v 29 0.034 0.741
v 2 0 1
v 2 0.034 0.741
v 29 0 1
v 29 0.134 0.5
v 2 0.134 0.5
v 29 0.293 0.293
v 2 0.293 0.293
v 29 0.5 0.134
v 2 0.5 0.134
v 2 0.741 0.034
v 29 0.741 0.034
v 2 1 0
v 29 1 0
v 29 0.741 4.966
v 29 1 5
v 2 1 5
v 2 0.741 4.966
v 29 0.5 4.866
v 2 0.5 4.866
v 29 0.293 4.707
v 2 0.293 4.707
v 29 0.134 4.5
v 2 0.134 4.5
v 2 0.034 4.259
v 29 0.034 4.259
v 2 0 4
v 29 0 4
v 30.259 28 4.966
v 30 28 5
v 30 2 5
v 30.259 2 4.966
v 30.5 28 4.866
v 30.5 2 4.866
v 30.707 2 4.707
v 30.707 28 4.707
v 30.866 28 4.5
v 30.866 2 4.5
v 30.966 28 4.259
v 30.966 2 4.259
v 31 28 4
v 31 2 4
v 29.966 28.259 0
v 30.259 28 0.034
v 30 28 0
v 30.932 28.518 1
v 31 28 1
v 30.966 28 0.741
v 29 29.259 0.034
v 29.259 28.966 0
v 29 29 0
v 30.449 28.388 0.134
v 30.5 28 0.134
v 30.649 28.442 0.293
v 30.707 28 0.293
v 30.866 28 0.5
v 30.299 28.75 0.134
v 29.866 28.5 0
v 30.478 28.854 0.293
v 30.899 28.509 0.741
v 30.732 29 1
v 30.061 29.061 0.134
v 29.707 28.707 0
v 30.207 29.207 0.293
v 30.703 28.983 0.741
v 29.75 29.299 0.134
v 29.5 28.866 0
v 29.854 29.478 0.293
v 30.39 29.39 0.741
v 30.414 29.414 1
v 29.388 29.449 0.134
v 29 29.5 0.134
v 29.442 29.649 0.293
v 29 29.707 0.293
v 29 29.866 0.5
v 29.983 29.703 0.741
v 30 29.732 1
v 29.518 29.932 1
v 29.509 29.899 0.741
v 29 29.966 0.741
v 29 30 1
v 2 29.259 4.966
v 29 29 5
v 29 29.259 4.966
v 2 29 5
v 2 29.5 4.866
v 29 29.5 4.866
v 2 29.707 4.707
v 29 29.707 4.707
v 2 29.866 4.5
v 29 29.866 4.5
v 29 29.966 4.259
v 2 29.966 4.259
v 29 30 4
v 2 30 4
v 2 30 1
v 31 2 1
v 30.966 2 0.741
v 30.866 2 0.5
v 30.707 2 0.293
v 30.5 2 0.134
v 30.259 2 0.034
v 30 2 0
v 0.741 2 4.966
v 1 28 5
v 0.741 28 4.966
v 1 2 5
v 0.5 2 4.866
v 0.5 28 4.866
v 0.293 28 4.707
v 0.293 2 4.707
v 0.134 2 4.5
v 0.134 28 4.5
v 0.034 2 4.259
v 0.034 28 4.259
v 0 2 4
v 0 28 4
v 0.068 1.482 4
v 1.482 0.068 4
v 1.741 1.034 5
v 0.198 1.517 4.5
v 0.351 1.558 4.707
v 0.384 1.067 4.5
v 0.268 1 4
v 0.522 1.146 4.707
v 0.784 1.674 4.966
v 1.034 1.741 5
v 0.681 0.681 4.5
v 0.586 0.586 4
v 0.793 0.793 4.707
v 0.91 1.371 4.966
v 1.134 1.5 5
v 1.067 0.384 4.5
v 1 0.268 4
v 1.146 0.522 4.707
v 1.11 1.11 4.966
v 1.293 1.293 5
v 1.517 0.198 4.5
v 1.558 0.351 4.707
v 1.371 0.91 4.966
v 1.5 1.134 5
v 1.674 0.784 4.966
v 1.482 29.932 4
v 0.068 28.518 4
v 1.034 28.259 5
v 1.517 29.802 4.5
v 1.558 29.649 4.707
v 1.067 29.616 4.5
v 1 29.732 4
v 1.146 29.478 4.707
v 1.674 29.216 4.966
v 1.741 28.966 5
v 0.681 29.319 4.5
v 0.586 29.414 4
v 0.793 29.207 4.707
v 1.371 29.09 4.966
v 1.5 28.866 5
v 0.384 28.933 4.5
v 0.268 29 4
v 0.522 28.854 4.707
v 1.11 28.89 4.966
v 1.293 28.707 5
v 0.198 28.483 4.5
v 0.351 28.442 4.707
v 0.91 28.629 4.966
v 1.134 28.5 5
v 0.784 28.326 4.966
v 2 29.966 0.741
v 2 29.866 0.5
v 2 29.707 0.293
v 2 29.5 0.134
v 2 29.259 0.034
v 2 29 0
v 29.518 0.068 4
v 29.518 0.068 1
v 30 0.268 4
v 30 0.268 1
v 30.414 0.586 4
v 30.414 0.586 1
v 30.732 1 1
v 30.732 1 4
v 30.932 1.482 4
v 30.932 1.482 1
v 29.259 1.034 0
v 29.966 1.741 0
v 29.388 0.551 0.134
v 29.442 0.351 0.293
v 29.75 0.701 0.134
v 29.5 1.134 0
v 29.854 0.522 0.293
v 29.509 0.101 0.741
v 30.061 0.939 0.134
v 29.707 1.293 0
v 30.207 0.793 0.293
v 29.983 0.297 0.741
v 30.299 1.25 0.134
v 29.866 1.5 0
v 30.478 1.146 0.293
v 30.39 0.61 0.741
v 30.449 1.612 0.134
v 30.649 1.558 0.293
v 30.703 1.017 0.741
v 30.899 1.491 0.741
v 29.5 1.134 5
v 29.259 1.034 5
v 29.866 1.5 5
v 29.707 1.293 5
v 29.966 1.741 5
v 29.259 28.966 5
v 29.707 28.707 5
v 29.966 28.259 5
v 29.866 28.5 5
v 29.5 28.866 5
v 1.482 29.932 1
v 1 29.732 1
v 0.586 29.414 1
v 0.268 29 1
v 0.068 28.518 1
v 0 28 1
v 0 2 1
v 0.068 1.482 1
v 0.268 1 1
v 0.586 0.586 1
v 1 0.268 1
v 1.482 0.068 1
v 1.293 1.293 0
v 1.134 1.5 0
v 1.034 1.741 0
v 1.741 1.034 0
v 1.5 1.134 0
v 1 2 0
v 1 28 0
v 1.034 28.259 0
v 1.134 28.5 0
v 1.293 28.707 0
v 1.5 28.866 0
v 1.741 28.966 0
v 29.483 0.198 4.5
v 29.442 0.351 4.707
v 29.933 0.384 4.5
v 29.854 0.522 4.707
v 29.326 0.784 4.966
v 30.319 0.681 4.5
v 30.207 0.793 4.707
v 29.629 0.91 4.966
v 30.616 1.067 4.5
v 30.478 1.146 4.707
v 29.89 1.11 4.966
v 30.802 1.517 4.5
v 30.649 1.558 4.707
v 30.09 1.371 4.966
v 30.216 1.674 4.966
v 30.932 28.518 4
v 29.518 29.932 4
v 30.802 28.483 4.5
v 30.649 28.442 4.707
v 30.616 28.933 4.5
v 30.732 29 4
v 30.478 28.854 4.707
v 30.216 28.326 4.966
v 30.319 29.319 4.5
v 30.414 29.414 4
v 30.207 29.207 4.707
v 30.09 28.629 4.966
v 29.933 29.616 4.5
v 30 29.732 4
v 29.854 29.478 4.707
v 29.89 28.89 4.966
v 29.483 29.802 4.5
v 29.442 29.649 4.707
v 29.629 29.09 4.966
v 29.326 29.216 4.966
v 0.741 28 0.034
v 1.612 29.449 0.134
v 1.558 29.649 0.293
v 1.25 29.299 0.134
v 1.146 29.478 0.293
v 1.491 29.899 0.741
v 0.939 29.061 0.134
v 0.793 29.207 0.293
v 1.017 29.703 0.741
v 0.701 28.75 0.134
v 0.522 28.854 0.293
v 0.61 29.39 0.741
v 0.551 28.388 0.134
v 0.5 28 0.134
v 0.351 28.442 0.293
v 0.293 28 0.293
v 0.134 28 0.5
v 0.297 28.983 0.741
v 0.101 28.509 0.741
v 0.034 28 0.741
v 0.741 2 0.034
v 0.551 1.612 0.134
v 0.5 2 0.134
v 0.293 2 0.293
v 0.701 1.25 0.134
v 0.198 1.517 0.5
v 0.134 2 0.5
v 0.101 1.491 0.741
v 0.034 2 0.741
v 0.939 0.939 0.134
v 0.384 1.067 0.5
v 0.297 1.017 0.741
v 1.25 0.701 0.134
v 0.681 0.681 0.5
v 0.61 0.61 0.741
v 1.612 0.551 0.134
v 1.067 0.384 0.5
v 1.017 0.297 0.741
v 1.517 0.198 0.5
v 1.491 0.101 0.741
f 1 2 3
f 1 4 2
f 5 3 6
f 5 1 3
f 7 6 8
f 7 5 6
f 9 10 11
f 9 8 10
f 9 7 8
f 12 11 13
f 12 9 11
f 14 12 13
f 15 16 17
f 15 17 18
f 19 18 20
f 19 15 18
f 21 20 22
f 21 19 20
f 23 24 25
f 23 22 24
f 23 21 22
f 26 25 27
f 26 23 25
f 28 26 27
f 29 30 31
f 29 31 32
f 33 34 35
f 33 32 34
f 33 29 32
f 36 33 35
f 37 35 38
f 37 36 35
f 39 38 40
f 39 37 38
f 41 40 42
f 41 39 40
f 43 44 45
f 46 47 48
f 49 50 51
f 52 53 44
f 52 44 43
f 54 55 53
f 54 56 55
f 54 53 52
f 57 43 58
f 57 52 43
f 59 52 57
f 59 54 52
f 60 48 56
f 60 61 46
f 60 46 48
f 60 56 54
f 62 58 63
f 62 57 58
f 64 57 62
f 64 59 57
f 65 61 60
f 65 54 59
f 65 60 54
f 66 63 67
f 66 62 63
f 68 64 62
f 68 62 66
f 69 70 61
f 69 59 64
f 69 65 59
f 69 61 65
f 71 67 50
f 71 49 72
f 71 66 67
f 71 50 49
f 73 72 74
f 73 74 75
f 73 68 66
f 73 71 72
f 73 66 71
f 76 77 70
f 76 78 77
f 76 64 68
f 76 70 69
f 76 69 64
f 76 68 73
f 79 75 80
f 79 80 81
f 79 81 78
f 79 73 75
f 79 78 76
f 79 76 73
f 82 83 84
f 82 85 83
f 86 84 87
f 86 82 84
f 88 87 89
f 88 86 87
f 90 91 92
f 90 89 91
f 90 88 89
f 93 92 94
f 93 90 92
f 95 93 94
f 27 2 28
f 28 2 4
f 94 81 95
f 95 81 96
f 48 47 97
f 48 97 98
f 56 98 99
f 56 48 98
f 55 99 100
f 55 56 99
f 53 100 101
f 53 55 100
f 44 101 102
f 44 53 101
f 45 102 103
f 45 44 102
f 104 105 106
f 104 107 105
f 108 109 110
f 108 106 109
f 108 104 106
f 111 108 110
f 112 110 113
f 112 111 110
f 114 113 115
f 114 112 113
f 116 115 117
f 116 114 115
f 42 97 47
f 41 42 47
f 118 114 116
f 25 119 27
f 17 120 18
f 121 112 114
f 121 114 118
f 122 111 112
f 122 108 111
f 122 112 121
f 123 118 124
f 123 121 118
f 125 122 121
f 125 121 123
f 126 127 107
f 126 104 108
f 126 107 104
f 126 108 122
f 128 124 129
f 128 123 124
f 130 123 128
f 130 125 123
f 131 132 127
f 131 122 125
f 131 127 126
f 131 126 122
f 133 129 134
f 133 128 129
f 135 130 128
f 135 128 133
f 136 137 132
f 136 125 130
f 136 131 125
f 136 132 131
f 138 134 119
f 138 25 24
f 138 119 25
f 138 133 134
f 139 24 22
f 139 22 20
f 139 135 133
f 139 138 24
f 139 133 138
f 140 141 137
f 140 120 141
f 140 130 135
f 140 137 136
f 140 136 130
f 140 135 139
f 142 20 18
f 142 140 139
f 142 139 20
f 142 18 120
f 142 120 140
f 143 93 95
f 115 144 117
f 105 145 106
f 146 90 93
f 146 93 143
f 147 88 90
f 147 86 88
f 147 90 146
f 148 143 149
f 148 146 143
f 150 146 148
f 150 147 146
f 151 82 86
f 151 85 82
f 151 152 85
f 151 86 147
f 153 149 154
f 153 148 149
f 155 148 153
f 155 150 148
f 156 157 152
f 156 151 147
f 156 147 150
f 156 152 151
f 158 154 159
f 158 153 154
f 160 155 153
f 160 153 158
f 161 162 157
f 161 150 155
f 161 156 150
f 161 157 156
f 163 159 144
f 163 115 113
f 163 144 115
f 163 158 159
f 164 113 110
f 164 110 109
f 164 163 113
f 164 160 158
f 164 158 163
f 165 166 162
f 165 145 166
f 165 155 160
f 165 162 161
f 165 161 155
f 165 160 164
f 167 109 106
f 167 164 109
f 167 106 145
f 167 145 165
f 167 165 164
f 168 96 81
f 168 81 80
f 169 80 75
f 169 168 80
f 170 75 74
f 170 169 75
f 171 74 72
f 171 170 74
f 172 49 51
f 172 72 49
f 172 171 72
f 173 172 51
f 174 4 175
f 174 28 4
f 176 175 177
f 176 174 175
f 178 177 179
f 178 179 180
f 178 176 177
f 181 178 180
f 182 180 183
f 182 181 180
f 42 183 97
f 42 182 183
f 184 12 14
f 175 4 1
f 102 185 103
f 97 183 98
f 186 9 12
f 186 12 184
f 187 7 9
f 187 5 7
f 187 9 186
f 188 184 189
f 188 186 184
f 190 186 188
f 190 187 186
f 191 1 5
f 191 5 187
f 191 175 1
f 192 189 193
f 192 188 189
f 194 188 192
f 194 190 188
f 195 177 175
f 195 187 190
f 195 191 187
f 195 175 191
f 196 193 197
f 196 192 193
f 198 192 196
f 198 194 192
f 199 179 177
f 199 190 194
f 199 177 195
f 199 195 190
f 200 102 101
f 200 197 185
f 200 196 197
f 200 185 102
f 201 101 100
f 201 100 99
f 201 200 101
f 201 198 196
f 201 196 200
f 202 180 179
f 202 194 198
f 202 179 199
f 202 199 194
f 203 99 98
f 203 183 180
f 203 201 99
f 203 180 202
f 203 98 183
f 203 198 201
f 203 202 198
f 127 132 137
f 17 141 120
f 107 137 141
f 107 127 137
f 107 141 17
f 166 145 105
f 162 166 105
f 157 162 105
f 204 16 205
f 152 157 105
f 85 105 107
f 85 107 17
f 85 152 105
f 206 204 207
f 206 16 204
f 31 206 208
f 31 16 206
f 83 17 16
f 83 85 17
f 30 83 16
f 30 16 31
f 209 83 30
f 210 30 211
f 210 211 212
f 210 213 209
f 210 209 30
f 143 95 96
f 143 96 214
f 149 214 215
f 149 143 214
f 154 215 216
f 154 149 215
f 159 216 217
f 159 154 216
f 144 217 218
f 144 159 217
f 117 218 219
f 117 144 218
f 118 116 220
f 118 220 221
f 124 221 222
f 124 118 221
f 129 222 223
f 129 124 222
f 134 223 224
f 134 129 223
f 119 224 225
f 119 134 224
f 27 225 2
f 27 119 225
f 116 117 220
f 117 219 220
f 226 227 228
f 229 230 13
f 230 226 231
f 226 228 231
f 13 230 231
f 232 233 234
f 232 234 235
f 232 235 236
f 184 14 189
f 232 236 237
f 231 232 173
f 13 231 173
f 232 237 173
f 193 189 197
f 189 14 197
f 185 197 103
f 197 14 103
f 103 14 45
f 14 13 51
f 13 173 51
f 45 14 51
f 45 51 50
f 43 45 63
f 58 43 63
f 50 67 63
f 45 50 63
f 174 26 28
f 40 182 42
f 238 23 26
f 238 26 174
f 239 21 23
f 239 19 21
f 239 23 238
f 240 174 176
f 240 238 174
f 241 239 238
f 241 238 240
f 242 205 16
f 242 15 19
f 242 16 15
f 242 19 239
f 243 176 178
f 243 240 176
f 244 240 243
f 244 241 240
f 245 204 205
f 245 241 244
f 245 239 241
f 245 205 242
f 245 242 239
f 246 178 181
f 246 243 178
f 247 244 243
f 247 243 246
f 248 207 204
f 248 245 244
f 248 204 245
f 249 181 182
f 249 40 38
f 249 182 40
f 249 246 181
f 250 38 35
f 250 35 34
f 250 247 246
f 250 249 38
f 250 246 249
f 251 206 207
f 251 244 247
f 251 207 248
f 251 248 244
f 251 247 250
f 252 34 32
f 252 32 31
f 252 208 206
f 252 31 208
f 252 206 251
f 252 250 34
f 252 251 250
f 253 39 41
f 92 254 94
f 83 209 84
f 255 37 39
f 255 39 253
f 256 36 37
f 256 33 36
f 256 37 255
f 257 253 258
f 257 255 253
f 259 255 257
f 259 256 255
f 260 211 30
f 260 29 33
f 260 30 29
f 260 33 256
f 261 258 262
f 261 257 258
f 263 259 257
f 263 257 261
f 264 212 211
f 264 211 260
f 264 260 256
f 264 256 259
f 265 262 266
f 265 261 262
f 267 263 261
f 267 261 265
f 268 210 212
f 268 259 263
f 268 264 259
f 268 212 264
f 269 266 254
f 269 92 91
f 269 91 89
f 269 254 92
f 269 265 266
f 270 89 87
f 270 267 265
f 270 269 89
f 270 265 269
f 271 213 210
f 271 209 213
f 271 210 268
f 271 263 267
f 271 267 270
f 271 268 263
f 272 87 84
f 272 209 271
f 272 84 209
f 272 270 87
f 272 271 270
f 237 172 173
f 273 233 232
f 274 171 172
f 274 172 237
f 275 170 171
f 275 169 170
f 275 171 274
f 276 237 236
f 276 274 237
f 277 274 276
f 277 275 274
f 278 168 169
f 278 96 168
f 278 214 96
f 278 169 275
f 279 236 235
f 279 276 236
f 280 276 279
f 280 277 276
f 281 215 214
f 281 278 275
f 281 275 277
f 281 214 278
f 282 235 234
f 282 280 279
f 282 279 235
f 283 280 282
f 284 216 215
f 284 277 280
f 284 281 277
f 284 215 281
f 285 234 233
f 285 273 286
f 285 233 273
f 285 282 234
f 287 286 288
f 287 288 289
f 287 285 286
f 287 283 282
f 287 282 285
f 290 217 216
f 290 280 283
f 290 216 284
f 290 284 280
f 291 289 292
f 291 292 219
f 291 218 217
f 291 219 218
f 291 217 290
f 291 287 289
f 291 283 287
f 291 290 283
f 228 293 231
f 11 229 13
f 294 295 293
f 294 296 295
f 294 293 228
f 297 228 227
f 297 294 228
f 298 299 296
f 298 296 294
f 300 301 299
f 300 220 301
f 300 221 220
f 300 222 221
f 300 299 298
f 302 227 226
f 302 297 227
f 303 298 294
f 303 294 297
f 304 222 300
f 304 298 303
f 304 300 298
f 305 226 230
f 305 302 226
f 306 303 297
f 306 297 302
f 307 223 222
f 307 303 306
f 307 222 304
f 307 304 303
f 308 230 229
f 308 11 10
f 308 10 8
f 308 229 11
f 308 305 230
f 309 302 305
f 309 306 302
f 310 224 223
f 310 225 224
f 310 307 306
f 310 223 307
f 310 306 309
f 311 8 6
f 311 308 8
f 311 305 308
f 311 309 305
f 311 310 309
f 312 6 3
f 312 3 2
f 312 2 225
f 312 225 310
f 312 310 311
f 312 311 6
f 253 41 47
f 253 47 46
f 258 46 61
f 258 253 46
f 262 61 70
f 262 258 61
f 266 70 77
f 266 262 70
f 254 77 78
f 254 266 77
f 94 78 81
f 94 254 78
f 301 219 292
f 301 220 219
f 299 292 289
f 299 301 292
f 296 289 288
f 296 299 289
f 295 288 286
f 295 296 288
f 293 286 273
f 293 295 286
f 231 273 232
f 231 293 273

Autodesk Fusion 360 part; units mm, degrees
sketch "Sketch1" plane through (0, 0, 0) normal (0, 0, 1) x (1, 0, 0)
  line L0 (0, 0) -> (31, 0)
  line L1 (31, 0) -> (31, 30)
  line L2 (31, 30) -> (0, 30)
  line L3 (0, 30) -> (0, 0)
  dimension "d1" = 31
  dimension "d2" = 30
extrude "Extrude1" add sketch "Sketch1" along normal blind 5
fillet "Fillet1" radius 2 1 edges at (31, 0, 2.5)
fillet "Fillet2" radius 2 1 edges at (31, 30, 2.5)
fillet "Fillet3" radius 2 1 edges at (0, 30, 2.5)
fillet "Fillet4" radius 2 1 edges at (0, 0, 2.5)
fillet "Fillet5" radius 1 8 edges at (0.5858, 0.5858, 5) (15.5, 0, 5) (30.4142, 0.5858, 5) (31, 15, 5) (30.4142, 29.4142, 5) (15.5, 30, 5) (0.5858, 29.4142, 5) (0, 15, 5)
fillet "Fillet6" radius 1 8 edges at (15.5, 0, 0) (30.4142, 0.5858, 0) (31, 15, 0) (30.4142, 29.4142, 0) (15.5, 30, 0) (0.5858, 29.4142, 0) (0, 15, 0) (0.5858, 0.5858, 0)
